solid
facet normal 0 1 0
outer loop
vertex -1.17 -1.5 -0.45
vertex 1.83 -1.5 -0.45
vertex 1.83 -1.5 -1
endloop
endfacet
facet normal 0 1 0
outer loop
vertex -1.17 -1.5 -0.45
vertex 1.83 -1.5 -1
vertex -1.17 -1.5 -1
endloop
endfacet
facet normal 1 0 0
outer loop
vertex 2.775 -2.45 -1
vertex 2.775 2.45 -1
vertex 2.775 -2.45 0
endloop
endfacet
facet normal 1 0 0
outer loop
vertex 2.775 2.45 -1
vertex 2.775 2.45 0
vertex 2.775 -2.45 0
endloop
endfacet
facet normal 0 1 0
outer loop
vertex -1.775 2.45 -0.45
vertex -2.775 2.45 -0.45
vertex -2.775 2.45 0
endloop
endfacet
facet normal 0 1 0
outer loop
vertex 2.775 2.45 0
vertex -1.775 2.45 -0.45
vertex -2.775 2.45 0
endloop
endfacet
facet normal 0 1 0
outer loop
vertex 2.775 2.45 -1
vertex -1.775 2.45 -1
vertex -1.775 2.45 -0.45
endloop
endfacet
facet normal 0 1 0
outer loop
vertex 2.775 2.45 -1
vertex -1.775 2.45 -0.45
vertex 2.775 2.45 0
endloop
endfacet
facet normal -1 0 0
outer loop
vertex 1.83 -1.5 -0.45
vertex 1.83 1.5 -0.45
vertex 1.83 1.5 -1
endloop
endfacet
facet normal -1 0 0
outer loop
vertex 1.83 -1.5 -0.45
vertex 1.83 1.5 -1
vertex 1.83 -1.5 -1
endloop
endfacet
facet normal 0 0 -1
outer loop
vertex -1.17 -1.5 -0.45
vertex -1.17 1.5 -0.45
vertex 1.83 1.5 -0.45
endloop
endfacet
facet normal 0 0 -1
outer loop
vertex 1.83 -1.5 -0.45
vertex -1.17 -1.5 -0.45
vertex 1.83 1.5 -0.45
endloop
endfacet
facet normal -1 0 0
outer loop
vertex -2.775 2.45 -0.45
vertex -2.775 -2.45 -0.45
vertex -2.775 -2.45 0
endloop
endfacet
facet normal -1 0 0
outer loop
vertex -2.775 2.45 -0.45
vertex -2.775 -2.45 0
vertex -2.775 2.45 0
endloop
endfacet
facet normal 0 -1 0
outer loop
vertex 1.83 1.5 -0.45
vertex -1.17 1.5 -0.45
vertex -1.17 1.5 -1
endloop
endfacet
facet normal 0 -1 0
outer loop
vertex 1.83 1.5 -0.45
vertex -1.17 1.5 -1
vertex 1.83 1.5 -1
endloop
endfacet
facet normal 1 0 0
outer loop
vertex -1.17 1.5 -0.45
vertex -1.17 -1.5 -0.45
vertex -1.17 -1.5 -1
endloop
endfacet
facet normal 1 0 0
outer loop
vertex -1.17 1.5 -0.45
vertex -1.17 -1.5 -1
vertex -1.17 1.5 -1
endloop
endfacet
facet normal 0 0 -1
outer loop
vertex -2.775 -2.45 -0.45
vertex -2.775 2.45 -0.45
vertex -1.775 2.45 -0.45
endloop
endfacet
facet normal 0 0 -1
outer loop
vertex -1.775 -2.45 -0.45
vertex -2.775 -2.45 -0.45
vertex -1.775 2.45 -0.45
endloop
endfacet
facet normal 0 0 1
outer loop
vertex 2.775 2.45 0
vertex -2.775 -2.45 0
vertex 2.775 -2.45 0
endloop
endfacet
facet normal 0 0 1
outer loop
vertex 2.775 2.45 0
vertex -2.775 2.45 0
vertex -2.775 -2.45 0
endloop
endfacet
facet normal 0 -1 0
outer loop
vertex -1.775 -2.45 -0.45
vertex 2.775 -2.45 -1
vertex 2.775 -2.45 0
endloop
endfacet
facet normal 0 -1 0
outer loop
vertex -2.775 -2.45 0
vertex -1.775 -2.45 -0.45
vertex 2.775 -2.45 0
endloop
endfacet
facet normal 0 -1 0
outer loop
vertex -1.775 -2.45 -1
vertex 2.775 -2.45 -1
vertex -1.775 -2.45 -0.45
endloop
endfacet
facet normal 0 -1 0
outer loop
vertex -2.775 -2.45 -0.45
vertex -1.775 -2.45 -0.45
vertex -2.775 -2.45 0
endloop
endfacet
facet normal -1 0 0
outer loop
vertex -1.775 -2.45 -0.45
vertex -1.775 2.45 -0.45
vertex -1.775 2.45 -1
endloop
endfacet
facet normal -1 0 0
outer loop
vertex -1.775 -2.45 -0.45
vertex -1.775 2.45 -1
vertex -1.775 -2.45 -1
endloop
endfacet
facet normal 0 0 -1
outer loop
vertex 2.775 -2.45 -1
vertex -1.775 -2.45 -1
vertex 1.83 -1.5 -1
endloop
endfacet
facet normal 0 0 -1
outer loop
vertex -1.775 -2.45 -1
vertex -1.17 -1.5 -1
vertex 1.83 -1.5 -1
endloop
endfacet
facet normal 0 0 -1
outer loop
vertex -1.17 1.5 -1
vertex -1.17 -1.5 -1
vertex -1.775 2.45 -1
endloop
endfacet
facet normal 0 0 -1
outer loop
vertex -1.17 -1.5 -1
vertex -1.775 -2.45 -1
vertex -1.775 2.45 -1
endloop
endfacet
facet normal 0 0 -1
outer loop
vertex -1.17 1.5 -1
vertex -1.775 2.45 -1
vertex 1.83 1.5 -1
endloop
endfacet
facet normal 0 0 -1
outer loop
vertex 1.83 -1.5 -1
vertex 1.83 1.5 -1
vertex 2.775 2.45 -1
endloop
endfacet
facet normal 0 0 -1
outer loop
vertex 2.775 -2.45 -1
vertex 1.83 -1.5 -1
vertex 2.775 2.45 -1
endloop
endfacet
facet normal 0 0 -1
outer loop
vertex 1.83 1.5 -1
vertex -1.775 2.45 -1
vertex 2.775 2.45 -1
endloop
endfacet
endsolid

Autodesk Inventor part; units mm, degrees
ref_plane "YZ Plane" through (0, 0, 0) normal (1, 0, 0) x (0, 1, 0)
ref_plane "XZ Plane" through (0, 0, 0) normal (0, 1, 0) x (-1, 0, 0)
sketch "Sketch1" plane through (0, 0, 0) normal (0, 0, 1) x (1, 0, 0)
  line L0 (-1.775, 2.45) -> (-1.775, -2.45) projected
  line L1 (2.775, -2.45) -> (-1.775, -2.45) projected
  line L2 (2.775, 2.45) -> (2.775, -2.45) projected
  line L3 (-1.775, 2.45) -> (2.775, 2.45) projected
  line L4 (1.83, 1.5) -> (1.83, -1.5) projected
  line L5 (1.83, -1.5) -> (-1.17, -1.5) projected
  line L6 (-1.17, -1.5) -> (-1.17, 1.5) projected
  line L7 (-1.17, 1.5) -> (1.83, 1.5) projected
  point P0 (0, 0)
extrude "Extrusion1" add sketch "Sketch1" against normal blind 1
sketch "Sketch2" plane through (0, 0, 0) normal (0, 0, 1) x (1, 0, 0)
  line L0 (1.83, 1.5) -> (-1.17, 1.5) projected
  line L1 (-1.17, 1.5) -> (-1.17, -1.5) projected
  line L2 (-1.17, -1.5) -> (1.83, -1.5) projected
  line L3 (1.83, -1.5) -> (1.83, 1.5) projected
  point P0 (0, 0)
extrude "Extrusion2" add sketch "Sketch2" against normal blind 0.45
ref_plane "Work Plane1" through (-2.275, 0, -0.45) normal (0, 0, 1) x (1, 0, 0)
sketch "Sketch3" plane through (-2.275, 0, -0.45) normal (0, 0, 1) x (1, 0, 0)
  line L0 (-0.5, 2.45) -> (0.5, 2.45) projected
  line L1 (-0.5, -2.45) -> (-0.5, 2.45) projected
  line L2 (0.5, -2.45) -> (-0.5, -2.45) projected
  line L3 (0.5, -2.45) -> (0.5, 2.45) projected
  point P0 (2.275, 0)
extrude "Extrusion3" add sketch "Sketch3" along normal blind 0.45
properties part number "mppcLens" material "Glass"
